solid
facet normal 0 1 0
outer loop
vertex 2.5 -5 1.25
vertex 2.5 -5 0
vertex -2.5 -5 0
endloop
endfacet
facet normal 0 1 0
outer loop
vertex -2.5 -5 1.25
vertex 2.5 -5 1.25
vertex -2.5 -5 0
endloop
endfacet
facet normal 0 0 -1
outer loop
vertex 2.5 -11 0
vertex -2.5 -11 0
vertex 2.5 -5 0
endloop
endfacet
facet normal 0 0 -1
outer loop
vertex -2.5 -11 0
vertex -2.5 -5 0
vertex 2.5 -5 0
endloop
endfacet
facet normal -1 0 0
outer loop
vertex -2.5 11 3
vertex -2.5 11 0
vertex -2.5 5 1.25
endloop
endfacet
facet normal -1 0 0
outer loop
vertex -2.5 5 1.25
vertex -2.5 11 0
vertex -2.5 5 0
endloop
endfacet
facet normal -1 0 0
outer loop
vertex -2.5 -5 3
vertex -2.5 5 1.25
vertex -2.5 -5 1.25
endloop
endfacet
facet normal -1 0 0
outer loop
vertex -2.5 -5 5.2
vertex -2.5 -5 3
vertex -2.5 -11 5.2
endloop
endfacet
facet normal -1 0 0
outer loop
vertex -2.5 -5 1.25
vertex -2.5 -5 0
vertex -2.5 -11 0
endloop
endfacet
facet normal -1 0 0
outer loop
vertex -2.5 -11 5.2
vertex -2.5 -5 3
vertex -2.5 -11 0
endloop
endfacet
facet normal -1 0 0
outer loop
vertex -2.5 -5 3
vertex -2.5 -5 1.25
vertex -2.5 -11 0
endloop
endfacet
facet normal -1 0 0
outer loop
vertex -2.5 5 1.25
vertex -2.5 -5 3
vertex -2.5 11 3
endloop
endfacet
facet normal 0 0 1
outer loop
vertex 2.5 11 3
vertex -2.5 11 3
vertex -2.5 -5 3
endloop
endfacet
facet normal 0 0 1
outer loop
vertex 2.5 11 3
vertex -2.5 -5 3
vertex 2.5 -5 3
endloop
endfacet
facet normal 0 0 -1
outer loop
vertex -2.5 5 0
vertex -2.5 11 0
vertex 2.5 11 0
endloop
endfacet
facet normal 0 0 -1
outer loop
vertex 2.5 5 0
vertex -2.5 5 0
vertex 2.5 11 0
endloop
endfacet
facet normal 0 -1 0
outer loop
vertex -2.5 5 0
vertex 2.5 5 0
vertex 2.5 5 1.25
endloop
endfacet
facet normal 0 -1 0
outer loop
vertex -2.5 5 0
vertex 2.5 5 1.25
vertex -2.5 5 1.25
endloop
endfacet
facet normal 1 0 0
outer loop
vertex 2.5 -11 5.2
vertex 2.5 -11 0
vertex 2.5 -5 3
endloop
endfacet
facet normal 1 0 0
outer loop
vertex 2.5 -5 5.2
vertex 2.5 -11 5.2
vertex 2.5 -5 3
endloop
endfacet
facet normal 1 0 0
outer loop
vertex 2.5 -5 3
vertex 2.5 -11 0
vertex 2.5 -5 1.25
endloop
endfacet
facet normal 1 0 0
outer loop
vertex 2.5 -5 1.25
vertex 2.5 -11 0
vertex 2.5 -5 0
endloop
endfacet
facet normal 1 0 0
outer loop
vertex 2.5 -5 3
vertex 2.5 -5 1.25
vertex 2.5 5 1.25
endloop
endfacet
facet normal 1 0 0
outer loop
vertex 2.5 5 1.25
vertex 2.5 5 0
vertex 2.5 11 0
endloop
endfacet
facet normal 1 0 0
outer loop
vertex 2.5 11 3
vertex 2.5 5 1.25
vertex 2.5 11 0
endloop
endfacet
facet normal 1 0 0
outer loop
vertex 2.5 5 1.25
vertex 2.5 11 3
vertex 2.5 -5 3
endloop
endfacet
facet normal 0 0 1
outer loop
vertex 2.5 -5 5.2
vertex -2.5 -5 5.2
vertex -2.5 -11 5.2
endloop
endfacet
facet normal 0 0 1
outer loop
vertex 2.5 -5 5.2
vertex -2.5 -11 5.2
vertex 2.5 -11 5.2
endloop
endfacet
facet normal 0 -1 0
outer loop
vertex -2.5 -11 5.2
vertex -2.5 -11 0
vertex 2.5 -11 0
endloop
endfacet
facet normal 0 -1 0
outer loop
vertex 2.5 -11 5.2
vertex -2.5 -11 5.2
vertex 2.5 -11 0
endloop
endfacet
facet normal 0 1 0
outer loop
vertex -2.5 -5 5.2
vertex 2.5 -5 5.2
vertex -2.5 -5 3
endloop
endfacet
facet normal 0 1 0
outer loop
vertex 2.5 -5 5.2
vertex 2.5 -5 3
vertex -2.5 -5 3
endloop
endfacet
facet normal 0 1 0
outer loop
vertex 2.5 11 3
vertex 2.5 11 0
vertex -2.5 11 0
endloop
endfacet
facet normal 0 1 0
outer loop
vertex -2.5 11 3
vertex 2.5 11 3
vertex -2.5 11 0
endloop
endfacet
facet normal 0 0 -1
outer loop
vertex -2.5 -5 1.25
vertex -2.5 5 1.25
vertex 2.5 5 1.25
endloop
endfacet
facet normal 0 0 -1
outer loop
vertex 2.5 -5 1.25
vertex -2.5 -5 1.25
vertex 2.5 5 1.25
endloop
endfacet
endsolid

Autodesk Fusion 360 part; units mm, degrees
sketch "Skizze1" plane through (0, 0, 0) normal (0, 0, 1) x (1, 0, 0)
  line L0 (2.5, 11) -> (-2.5, 11)
  line L1 (-2.5, 11) -> (-2.5, -11)
  line L2 (-2.5, -11) -> (2.5, -11)
  line L3 (2.5, -11) -> (2.5, 11)
  line L4 (2.5, 11) -> (-2.5, -11) construction
  line L5 (-2.5, 11) -> (2.5, -11) construction
  line L6 (-2.5, -11) -> (2.5, -11)
  line L7 (2.5, -11) -> (2.5, -5)
  line L8 (2.5, -5) -> (-2.5, -5)
  line L9 (-2.5, -5) -> (-2.5, -11)
  line L10 (2.5, -5) -> (2.5, 5) construction
  line L11 (2.5, 5) -> (-2.5, 5)
  dimension "d1" = 5
  dimension "d2" = 22
  dimension "d3" = 5
  dimension "d4" = 6
  dimension "d13" = 10
extrude "Extrusion4" add sketch "Skizze1" along normal blind 3
extrude "Extrusion5" add sketch "Skizze1" along normal blind 5.2 contours L1 L2 L3 L6 L7 L8 L9
extrude "Extrusion6" cut sketch "Skizze1" along normal blind 1.25 contours L1 L3 L8 L11
